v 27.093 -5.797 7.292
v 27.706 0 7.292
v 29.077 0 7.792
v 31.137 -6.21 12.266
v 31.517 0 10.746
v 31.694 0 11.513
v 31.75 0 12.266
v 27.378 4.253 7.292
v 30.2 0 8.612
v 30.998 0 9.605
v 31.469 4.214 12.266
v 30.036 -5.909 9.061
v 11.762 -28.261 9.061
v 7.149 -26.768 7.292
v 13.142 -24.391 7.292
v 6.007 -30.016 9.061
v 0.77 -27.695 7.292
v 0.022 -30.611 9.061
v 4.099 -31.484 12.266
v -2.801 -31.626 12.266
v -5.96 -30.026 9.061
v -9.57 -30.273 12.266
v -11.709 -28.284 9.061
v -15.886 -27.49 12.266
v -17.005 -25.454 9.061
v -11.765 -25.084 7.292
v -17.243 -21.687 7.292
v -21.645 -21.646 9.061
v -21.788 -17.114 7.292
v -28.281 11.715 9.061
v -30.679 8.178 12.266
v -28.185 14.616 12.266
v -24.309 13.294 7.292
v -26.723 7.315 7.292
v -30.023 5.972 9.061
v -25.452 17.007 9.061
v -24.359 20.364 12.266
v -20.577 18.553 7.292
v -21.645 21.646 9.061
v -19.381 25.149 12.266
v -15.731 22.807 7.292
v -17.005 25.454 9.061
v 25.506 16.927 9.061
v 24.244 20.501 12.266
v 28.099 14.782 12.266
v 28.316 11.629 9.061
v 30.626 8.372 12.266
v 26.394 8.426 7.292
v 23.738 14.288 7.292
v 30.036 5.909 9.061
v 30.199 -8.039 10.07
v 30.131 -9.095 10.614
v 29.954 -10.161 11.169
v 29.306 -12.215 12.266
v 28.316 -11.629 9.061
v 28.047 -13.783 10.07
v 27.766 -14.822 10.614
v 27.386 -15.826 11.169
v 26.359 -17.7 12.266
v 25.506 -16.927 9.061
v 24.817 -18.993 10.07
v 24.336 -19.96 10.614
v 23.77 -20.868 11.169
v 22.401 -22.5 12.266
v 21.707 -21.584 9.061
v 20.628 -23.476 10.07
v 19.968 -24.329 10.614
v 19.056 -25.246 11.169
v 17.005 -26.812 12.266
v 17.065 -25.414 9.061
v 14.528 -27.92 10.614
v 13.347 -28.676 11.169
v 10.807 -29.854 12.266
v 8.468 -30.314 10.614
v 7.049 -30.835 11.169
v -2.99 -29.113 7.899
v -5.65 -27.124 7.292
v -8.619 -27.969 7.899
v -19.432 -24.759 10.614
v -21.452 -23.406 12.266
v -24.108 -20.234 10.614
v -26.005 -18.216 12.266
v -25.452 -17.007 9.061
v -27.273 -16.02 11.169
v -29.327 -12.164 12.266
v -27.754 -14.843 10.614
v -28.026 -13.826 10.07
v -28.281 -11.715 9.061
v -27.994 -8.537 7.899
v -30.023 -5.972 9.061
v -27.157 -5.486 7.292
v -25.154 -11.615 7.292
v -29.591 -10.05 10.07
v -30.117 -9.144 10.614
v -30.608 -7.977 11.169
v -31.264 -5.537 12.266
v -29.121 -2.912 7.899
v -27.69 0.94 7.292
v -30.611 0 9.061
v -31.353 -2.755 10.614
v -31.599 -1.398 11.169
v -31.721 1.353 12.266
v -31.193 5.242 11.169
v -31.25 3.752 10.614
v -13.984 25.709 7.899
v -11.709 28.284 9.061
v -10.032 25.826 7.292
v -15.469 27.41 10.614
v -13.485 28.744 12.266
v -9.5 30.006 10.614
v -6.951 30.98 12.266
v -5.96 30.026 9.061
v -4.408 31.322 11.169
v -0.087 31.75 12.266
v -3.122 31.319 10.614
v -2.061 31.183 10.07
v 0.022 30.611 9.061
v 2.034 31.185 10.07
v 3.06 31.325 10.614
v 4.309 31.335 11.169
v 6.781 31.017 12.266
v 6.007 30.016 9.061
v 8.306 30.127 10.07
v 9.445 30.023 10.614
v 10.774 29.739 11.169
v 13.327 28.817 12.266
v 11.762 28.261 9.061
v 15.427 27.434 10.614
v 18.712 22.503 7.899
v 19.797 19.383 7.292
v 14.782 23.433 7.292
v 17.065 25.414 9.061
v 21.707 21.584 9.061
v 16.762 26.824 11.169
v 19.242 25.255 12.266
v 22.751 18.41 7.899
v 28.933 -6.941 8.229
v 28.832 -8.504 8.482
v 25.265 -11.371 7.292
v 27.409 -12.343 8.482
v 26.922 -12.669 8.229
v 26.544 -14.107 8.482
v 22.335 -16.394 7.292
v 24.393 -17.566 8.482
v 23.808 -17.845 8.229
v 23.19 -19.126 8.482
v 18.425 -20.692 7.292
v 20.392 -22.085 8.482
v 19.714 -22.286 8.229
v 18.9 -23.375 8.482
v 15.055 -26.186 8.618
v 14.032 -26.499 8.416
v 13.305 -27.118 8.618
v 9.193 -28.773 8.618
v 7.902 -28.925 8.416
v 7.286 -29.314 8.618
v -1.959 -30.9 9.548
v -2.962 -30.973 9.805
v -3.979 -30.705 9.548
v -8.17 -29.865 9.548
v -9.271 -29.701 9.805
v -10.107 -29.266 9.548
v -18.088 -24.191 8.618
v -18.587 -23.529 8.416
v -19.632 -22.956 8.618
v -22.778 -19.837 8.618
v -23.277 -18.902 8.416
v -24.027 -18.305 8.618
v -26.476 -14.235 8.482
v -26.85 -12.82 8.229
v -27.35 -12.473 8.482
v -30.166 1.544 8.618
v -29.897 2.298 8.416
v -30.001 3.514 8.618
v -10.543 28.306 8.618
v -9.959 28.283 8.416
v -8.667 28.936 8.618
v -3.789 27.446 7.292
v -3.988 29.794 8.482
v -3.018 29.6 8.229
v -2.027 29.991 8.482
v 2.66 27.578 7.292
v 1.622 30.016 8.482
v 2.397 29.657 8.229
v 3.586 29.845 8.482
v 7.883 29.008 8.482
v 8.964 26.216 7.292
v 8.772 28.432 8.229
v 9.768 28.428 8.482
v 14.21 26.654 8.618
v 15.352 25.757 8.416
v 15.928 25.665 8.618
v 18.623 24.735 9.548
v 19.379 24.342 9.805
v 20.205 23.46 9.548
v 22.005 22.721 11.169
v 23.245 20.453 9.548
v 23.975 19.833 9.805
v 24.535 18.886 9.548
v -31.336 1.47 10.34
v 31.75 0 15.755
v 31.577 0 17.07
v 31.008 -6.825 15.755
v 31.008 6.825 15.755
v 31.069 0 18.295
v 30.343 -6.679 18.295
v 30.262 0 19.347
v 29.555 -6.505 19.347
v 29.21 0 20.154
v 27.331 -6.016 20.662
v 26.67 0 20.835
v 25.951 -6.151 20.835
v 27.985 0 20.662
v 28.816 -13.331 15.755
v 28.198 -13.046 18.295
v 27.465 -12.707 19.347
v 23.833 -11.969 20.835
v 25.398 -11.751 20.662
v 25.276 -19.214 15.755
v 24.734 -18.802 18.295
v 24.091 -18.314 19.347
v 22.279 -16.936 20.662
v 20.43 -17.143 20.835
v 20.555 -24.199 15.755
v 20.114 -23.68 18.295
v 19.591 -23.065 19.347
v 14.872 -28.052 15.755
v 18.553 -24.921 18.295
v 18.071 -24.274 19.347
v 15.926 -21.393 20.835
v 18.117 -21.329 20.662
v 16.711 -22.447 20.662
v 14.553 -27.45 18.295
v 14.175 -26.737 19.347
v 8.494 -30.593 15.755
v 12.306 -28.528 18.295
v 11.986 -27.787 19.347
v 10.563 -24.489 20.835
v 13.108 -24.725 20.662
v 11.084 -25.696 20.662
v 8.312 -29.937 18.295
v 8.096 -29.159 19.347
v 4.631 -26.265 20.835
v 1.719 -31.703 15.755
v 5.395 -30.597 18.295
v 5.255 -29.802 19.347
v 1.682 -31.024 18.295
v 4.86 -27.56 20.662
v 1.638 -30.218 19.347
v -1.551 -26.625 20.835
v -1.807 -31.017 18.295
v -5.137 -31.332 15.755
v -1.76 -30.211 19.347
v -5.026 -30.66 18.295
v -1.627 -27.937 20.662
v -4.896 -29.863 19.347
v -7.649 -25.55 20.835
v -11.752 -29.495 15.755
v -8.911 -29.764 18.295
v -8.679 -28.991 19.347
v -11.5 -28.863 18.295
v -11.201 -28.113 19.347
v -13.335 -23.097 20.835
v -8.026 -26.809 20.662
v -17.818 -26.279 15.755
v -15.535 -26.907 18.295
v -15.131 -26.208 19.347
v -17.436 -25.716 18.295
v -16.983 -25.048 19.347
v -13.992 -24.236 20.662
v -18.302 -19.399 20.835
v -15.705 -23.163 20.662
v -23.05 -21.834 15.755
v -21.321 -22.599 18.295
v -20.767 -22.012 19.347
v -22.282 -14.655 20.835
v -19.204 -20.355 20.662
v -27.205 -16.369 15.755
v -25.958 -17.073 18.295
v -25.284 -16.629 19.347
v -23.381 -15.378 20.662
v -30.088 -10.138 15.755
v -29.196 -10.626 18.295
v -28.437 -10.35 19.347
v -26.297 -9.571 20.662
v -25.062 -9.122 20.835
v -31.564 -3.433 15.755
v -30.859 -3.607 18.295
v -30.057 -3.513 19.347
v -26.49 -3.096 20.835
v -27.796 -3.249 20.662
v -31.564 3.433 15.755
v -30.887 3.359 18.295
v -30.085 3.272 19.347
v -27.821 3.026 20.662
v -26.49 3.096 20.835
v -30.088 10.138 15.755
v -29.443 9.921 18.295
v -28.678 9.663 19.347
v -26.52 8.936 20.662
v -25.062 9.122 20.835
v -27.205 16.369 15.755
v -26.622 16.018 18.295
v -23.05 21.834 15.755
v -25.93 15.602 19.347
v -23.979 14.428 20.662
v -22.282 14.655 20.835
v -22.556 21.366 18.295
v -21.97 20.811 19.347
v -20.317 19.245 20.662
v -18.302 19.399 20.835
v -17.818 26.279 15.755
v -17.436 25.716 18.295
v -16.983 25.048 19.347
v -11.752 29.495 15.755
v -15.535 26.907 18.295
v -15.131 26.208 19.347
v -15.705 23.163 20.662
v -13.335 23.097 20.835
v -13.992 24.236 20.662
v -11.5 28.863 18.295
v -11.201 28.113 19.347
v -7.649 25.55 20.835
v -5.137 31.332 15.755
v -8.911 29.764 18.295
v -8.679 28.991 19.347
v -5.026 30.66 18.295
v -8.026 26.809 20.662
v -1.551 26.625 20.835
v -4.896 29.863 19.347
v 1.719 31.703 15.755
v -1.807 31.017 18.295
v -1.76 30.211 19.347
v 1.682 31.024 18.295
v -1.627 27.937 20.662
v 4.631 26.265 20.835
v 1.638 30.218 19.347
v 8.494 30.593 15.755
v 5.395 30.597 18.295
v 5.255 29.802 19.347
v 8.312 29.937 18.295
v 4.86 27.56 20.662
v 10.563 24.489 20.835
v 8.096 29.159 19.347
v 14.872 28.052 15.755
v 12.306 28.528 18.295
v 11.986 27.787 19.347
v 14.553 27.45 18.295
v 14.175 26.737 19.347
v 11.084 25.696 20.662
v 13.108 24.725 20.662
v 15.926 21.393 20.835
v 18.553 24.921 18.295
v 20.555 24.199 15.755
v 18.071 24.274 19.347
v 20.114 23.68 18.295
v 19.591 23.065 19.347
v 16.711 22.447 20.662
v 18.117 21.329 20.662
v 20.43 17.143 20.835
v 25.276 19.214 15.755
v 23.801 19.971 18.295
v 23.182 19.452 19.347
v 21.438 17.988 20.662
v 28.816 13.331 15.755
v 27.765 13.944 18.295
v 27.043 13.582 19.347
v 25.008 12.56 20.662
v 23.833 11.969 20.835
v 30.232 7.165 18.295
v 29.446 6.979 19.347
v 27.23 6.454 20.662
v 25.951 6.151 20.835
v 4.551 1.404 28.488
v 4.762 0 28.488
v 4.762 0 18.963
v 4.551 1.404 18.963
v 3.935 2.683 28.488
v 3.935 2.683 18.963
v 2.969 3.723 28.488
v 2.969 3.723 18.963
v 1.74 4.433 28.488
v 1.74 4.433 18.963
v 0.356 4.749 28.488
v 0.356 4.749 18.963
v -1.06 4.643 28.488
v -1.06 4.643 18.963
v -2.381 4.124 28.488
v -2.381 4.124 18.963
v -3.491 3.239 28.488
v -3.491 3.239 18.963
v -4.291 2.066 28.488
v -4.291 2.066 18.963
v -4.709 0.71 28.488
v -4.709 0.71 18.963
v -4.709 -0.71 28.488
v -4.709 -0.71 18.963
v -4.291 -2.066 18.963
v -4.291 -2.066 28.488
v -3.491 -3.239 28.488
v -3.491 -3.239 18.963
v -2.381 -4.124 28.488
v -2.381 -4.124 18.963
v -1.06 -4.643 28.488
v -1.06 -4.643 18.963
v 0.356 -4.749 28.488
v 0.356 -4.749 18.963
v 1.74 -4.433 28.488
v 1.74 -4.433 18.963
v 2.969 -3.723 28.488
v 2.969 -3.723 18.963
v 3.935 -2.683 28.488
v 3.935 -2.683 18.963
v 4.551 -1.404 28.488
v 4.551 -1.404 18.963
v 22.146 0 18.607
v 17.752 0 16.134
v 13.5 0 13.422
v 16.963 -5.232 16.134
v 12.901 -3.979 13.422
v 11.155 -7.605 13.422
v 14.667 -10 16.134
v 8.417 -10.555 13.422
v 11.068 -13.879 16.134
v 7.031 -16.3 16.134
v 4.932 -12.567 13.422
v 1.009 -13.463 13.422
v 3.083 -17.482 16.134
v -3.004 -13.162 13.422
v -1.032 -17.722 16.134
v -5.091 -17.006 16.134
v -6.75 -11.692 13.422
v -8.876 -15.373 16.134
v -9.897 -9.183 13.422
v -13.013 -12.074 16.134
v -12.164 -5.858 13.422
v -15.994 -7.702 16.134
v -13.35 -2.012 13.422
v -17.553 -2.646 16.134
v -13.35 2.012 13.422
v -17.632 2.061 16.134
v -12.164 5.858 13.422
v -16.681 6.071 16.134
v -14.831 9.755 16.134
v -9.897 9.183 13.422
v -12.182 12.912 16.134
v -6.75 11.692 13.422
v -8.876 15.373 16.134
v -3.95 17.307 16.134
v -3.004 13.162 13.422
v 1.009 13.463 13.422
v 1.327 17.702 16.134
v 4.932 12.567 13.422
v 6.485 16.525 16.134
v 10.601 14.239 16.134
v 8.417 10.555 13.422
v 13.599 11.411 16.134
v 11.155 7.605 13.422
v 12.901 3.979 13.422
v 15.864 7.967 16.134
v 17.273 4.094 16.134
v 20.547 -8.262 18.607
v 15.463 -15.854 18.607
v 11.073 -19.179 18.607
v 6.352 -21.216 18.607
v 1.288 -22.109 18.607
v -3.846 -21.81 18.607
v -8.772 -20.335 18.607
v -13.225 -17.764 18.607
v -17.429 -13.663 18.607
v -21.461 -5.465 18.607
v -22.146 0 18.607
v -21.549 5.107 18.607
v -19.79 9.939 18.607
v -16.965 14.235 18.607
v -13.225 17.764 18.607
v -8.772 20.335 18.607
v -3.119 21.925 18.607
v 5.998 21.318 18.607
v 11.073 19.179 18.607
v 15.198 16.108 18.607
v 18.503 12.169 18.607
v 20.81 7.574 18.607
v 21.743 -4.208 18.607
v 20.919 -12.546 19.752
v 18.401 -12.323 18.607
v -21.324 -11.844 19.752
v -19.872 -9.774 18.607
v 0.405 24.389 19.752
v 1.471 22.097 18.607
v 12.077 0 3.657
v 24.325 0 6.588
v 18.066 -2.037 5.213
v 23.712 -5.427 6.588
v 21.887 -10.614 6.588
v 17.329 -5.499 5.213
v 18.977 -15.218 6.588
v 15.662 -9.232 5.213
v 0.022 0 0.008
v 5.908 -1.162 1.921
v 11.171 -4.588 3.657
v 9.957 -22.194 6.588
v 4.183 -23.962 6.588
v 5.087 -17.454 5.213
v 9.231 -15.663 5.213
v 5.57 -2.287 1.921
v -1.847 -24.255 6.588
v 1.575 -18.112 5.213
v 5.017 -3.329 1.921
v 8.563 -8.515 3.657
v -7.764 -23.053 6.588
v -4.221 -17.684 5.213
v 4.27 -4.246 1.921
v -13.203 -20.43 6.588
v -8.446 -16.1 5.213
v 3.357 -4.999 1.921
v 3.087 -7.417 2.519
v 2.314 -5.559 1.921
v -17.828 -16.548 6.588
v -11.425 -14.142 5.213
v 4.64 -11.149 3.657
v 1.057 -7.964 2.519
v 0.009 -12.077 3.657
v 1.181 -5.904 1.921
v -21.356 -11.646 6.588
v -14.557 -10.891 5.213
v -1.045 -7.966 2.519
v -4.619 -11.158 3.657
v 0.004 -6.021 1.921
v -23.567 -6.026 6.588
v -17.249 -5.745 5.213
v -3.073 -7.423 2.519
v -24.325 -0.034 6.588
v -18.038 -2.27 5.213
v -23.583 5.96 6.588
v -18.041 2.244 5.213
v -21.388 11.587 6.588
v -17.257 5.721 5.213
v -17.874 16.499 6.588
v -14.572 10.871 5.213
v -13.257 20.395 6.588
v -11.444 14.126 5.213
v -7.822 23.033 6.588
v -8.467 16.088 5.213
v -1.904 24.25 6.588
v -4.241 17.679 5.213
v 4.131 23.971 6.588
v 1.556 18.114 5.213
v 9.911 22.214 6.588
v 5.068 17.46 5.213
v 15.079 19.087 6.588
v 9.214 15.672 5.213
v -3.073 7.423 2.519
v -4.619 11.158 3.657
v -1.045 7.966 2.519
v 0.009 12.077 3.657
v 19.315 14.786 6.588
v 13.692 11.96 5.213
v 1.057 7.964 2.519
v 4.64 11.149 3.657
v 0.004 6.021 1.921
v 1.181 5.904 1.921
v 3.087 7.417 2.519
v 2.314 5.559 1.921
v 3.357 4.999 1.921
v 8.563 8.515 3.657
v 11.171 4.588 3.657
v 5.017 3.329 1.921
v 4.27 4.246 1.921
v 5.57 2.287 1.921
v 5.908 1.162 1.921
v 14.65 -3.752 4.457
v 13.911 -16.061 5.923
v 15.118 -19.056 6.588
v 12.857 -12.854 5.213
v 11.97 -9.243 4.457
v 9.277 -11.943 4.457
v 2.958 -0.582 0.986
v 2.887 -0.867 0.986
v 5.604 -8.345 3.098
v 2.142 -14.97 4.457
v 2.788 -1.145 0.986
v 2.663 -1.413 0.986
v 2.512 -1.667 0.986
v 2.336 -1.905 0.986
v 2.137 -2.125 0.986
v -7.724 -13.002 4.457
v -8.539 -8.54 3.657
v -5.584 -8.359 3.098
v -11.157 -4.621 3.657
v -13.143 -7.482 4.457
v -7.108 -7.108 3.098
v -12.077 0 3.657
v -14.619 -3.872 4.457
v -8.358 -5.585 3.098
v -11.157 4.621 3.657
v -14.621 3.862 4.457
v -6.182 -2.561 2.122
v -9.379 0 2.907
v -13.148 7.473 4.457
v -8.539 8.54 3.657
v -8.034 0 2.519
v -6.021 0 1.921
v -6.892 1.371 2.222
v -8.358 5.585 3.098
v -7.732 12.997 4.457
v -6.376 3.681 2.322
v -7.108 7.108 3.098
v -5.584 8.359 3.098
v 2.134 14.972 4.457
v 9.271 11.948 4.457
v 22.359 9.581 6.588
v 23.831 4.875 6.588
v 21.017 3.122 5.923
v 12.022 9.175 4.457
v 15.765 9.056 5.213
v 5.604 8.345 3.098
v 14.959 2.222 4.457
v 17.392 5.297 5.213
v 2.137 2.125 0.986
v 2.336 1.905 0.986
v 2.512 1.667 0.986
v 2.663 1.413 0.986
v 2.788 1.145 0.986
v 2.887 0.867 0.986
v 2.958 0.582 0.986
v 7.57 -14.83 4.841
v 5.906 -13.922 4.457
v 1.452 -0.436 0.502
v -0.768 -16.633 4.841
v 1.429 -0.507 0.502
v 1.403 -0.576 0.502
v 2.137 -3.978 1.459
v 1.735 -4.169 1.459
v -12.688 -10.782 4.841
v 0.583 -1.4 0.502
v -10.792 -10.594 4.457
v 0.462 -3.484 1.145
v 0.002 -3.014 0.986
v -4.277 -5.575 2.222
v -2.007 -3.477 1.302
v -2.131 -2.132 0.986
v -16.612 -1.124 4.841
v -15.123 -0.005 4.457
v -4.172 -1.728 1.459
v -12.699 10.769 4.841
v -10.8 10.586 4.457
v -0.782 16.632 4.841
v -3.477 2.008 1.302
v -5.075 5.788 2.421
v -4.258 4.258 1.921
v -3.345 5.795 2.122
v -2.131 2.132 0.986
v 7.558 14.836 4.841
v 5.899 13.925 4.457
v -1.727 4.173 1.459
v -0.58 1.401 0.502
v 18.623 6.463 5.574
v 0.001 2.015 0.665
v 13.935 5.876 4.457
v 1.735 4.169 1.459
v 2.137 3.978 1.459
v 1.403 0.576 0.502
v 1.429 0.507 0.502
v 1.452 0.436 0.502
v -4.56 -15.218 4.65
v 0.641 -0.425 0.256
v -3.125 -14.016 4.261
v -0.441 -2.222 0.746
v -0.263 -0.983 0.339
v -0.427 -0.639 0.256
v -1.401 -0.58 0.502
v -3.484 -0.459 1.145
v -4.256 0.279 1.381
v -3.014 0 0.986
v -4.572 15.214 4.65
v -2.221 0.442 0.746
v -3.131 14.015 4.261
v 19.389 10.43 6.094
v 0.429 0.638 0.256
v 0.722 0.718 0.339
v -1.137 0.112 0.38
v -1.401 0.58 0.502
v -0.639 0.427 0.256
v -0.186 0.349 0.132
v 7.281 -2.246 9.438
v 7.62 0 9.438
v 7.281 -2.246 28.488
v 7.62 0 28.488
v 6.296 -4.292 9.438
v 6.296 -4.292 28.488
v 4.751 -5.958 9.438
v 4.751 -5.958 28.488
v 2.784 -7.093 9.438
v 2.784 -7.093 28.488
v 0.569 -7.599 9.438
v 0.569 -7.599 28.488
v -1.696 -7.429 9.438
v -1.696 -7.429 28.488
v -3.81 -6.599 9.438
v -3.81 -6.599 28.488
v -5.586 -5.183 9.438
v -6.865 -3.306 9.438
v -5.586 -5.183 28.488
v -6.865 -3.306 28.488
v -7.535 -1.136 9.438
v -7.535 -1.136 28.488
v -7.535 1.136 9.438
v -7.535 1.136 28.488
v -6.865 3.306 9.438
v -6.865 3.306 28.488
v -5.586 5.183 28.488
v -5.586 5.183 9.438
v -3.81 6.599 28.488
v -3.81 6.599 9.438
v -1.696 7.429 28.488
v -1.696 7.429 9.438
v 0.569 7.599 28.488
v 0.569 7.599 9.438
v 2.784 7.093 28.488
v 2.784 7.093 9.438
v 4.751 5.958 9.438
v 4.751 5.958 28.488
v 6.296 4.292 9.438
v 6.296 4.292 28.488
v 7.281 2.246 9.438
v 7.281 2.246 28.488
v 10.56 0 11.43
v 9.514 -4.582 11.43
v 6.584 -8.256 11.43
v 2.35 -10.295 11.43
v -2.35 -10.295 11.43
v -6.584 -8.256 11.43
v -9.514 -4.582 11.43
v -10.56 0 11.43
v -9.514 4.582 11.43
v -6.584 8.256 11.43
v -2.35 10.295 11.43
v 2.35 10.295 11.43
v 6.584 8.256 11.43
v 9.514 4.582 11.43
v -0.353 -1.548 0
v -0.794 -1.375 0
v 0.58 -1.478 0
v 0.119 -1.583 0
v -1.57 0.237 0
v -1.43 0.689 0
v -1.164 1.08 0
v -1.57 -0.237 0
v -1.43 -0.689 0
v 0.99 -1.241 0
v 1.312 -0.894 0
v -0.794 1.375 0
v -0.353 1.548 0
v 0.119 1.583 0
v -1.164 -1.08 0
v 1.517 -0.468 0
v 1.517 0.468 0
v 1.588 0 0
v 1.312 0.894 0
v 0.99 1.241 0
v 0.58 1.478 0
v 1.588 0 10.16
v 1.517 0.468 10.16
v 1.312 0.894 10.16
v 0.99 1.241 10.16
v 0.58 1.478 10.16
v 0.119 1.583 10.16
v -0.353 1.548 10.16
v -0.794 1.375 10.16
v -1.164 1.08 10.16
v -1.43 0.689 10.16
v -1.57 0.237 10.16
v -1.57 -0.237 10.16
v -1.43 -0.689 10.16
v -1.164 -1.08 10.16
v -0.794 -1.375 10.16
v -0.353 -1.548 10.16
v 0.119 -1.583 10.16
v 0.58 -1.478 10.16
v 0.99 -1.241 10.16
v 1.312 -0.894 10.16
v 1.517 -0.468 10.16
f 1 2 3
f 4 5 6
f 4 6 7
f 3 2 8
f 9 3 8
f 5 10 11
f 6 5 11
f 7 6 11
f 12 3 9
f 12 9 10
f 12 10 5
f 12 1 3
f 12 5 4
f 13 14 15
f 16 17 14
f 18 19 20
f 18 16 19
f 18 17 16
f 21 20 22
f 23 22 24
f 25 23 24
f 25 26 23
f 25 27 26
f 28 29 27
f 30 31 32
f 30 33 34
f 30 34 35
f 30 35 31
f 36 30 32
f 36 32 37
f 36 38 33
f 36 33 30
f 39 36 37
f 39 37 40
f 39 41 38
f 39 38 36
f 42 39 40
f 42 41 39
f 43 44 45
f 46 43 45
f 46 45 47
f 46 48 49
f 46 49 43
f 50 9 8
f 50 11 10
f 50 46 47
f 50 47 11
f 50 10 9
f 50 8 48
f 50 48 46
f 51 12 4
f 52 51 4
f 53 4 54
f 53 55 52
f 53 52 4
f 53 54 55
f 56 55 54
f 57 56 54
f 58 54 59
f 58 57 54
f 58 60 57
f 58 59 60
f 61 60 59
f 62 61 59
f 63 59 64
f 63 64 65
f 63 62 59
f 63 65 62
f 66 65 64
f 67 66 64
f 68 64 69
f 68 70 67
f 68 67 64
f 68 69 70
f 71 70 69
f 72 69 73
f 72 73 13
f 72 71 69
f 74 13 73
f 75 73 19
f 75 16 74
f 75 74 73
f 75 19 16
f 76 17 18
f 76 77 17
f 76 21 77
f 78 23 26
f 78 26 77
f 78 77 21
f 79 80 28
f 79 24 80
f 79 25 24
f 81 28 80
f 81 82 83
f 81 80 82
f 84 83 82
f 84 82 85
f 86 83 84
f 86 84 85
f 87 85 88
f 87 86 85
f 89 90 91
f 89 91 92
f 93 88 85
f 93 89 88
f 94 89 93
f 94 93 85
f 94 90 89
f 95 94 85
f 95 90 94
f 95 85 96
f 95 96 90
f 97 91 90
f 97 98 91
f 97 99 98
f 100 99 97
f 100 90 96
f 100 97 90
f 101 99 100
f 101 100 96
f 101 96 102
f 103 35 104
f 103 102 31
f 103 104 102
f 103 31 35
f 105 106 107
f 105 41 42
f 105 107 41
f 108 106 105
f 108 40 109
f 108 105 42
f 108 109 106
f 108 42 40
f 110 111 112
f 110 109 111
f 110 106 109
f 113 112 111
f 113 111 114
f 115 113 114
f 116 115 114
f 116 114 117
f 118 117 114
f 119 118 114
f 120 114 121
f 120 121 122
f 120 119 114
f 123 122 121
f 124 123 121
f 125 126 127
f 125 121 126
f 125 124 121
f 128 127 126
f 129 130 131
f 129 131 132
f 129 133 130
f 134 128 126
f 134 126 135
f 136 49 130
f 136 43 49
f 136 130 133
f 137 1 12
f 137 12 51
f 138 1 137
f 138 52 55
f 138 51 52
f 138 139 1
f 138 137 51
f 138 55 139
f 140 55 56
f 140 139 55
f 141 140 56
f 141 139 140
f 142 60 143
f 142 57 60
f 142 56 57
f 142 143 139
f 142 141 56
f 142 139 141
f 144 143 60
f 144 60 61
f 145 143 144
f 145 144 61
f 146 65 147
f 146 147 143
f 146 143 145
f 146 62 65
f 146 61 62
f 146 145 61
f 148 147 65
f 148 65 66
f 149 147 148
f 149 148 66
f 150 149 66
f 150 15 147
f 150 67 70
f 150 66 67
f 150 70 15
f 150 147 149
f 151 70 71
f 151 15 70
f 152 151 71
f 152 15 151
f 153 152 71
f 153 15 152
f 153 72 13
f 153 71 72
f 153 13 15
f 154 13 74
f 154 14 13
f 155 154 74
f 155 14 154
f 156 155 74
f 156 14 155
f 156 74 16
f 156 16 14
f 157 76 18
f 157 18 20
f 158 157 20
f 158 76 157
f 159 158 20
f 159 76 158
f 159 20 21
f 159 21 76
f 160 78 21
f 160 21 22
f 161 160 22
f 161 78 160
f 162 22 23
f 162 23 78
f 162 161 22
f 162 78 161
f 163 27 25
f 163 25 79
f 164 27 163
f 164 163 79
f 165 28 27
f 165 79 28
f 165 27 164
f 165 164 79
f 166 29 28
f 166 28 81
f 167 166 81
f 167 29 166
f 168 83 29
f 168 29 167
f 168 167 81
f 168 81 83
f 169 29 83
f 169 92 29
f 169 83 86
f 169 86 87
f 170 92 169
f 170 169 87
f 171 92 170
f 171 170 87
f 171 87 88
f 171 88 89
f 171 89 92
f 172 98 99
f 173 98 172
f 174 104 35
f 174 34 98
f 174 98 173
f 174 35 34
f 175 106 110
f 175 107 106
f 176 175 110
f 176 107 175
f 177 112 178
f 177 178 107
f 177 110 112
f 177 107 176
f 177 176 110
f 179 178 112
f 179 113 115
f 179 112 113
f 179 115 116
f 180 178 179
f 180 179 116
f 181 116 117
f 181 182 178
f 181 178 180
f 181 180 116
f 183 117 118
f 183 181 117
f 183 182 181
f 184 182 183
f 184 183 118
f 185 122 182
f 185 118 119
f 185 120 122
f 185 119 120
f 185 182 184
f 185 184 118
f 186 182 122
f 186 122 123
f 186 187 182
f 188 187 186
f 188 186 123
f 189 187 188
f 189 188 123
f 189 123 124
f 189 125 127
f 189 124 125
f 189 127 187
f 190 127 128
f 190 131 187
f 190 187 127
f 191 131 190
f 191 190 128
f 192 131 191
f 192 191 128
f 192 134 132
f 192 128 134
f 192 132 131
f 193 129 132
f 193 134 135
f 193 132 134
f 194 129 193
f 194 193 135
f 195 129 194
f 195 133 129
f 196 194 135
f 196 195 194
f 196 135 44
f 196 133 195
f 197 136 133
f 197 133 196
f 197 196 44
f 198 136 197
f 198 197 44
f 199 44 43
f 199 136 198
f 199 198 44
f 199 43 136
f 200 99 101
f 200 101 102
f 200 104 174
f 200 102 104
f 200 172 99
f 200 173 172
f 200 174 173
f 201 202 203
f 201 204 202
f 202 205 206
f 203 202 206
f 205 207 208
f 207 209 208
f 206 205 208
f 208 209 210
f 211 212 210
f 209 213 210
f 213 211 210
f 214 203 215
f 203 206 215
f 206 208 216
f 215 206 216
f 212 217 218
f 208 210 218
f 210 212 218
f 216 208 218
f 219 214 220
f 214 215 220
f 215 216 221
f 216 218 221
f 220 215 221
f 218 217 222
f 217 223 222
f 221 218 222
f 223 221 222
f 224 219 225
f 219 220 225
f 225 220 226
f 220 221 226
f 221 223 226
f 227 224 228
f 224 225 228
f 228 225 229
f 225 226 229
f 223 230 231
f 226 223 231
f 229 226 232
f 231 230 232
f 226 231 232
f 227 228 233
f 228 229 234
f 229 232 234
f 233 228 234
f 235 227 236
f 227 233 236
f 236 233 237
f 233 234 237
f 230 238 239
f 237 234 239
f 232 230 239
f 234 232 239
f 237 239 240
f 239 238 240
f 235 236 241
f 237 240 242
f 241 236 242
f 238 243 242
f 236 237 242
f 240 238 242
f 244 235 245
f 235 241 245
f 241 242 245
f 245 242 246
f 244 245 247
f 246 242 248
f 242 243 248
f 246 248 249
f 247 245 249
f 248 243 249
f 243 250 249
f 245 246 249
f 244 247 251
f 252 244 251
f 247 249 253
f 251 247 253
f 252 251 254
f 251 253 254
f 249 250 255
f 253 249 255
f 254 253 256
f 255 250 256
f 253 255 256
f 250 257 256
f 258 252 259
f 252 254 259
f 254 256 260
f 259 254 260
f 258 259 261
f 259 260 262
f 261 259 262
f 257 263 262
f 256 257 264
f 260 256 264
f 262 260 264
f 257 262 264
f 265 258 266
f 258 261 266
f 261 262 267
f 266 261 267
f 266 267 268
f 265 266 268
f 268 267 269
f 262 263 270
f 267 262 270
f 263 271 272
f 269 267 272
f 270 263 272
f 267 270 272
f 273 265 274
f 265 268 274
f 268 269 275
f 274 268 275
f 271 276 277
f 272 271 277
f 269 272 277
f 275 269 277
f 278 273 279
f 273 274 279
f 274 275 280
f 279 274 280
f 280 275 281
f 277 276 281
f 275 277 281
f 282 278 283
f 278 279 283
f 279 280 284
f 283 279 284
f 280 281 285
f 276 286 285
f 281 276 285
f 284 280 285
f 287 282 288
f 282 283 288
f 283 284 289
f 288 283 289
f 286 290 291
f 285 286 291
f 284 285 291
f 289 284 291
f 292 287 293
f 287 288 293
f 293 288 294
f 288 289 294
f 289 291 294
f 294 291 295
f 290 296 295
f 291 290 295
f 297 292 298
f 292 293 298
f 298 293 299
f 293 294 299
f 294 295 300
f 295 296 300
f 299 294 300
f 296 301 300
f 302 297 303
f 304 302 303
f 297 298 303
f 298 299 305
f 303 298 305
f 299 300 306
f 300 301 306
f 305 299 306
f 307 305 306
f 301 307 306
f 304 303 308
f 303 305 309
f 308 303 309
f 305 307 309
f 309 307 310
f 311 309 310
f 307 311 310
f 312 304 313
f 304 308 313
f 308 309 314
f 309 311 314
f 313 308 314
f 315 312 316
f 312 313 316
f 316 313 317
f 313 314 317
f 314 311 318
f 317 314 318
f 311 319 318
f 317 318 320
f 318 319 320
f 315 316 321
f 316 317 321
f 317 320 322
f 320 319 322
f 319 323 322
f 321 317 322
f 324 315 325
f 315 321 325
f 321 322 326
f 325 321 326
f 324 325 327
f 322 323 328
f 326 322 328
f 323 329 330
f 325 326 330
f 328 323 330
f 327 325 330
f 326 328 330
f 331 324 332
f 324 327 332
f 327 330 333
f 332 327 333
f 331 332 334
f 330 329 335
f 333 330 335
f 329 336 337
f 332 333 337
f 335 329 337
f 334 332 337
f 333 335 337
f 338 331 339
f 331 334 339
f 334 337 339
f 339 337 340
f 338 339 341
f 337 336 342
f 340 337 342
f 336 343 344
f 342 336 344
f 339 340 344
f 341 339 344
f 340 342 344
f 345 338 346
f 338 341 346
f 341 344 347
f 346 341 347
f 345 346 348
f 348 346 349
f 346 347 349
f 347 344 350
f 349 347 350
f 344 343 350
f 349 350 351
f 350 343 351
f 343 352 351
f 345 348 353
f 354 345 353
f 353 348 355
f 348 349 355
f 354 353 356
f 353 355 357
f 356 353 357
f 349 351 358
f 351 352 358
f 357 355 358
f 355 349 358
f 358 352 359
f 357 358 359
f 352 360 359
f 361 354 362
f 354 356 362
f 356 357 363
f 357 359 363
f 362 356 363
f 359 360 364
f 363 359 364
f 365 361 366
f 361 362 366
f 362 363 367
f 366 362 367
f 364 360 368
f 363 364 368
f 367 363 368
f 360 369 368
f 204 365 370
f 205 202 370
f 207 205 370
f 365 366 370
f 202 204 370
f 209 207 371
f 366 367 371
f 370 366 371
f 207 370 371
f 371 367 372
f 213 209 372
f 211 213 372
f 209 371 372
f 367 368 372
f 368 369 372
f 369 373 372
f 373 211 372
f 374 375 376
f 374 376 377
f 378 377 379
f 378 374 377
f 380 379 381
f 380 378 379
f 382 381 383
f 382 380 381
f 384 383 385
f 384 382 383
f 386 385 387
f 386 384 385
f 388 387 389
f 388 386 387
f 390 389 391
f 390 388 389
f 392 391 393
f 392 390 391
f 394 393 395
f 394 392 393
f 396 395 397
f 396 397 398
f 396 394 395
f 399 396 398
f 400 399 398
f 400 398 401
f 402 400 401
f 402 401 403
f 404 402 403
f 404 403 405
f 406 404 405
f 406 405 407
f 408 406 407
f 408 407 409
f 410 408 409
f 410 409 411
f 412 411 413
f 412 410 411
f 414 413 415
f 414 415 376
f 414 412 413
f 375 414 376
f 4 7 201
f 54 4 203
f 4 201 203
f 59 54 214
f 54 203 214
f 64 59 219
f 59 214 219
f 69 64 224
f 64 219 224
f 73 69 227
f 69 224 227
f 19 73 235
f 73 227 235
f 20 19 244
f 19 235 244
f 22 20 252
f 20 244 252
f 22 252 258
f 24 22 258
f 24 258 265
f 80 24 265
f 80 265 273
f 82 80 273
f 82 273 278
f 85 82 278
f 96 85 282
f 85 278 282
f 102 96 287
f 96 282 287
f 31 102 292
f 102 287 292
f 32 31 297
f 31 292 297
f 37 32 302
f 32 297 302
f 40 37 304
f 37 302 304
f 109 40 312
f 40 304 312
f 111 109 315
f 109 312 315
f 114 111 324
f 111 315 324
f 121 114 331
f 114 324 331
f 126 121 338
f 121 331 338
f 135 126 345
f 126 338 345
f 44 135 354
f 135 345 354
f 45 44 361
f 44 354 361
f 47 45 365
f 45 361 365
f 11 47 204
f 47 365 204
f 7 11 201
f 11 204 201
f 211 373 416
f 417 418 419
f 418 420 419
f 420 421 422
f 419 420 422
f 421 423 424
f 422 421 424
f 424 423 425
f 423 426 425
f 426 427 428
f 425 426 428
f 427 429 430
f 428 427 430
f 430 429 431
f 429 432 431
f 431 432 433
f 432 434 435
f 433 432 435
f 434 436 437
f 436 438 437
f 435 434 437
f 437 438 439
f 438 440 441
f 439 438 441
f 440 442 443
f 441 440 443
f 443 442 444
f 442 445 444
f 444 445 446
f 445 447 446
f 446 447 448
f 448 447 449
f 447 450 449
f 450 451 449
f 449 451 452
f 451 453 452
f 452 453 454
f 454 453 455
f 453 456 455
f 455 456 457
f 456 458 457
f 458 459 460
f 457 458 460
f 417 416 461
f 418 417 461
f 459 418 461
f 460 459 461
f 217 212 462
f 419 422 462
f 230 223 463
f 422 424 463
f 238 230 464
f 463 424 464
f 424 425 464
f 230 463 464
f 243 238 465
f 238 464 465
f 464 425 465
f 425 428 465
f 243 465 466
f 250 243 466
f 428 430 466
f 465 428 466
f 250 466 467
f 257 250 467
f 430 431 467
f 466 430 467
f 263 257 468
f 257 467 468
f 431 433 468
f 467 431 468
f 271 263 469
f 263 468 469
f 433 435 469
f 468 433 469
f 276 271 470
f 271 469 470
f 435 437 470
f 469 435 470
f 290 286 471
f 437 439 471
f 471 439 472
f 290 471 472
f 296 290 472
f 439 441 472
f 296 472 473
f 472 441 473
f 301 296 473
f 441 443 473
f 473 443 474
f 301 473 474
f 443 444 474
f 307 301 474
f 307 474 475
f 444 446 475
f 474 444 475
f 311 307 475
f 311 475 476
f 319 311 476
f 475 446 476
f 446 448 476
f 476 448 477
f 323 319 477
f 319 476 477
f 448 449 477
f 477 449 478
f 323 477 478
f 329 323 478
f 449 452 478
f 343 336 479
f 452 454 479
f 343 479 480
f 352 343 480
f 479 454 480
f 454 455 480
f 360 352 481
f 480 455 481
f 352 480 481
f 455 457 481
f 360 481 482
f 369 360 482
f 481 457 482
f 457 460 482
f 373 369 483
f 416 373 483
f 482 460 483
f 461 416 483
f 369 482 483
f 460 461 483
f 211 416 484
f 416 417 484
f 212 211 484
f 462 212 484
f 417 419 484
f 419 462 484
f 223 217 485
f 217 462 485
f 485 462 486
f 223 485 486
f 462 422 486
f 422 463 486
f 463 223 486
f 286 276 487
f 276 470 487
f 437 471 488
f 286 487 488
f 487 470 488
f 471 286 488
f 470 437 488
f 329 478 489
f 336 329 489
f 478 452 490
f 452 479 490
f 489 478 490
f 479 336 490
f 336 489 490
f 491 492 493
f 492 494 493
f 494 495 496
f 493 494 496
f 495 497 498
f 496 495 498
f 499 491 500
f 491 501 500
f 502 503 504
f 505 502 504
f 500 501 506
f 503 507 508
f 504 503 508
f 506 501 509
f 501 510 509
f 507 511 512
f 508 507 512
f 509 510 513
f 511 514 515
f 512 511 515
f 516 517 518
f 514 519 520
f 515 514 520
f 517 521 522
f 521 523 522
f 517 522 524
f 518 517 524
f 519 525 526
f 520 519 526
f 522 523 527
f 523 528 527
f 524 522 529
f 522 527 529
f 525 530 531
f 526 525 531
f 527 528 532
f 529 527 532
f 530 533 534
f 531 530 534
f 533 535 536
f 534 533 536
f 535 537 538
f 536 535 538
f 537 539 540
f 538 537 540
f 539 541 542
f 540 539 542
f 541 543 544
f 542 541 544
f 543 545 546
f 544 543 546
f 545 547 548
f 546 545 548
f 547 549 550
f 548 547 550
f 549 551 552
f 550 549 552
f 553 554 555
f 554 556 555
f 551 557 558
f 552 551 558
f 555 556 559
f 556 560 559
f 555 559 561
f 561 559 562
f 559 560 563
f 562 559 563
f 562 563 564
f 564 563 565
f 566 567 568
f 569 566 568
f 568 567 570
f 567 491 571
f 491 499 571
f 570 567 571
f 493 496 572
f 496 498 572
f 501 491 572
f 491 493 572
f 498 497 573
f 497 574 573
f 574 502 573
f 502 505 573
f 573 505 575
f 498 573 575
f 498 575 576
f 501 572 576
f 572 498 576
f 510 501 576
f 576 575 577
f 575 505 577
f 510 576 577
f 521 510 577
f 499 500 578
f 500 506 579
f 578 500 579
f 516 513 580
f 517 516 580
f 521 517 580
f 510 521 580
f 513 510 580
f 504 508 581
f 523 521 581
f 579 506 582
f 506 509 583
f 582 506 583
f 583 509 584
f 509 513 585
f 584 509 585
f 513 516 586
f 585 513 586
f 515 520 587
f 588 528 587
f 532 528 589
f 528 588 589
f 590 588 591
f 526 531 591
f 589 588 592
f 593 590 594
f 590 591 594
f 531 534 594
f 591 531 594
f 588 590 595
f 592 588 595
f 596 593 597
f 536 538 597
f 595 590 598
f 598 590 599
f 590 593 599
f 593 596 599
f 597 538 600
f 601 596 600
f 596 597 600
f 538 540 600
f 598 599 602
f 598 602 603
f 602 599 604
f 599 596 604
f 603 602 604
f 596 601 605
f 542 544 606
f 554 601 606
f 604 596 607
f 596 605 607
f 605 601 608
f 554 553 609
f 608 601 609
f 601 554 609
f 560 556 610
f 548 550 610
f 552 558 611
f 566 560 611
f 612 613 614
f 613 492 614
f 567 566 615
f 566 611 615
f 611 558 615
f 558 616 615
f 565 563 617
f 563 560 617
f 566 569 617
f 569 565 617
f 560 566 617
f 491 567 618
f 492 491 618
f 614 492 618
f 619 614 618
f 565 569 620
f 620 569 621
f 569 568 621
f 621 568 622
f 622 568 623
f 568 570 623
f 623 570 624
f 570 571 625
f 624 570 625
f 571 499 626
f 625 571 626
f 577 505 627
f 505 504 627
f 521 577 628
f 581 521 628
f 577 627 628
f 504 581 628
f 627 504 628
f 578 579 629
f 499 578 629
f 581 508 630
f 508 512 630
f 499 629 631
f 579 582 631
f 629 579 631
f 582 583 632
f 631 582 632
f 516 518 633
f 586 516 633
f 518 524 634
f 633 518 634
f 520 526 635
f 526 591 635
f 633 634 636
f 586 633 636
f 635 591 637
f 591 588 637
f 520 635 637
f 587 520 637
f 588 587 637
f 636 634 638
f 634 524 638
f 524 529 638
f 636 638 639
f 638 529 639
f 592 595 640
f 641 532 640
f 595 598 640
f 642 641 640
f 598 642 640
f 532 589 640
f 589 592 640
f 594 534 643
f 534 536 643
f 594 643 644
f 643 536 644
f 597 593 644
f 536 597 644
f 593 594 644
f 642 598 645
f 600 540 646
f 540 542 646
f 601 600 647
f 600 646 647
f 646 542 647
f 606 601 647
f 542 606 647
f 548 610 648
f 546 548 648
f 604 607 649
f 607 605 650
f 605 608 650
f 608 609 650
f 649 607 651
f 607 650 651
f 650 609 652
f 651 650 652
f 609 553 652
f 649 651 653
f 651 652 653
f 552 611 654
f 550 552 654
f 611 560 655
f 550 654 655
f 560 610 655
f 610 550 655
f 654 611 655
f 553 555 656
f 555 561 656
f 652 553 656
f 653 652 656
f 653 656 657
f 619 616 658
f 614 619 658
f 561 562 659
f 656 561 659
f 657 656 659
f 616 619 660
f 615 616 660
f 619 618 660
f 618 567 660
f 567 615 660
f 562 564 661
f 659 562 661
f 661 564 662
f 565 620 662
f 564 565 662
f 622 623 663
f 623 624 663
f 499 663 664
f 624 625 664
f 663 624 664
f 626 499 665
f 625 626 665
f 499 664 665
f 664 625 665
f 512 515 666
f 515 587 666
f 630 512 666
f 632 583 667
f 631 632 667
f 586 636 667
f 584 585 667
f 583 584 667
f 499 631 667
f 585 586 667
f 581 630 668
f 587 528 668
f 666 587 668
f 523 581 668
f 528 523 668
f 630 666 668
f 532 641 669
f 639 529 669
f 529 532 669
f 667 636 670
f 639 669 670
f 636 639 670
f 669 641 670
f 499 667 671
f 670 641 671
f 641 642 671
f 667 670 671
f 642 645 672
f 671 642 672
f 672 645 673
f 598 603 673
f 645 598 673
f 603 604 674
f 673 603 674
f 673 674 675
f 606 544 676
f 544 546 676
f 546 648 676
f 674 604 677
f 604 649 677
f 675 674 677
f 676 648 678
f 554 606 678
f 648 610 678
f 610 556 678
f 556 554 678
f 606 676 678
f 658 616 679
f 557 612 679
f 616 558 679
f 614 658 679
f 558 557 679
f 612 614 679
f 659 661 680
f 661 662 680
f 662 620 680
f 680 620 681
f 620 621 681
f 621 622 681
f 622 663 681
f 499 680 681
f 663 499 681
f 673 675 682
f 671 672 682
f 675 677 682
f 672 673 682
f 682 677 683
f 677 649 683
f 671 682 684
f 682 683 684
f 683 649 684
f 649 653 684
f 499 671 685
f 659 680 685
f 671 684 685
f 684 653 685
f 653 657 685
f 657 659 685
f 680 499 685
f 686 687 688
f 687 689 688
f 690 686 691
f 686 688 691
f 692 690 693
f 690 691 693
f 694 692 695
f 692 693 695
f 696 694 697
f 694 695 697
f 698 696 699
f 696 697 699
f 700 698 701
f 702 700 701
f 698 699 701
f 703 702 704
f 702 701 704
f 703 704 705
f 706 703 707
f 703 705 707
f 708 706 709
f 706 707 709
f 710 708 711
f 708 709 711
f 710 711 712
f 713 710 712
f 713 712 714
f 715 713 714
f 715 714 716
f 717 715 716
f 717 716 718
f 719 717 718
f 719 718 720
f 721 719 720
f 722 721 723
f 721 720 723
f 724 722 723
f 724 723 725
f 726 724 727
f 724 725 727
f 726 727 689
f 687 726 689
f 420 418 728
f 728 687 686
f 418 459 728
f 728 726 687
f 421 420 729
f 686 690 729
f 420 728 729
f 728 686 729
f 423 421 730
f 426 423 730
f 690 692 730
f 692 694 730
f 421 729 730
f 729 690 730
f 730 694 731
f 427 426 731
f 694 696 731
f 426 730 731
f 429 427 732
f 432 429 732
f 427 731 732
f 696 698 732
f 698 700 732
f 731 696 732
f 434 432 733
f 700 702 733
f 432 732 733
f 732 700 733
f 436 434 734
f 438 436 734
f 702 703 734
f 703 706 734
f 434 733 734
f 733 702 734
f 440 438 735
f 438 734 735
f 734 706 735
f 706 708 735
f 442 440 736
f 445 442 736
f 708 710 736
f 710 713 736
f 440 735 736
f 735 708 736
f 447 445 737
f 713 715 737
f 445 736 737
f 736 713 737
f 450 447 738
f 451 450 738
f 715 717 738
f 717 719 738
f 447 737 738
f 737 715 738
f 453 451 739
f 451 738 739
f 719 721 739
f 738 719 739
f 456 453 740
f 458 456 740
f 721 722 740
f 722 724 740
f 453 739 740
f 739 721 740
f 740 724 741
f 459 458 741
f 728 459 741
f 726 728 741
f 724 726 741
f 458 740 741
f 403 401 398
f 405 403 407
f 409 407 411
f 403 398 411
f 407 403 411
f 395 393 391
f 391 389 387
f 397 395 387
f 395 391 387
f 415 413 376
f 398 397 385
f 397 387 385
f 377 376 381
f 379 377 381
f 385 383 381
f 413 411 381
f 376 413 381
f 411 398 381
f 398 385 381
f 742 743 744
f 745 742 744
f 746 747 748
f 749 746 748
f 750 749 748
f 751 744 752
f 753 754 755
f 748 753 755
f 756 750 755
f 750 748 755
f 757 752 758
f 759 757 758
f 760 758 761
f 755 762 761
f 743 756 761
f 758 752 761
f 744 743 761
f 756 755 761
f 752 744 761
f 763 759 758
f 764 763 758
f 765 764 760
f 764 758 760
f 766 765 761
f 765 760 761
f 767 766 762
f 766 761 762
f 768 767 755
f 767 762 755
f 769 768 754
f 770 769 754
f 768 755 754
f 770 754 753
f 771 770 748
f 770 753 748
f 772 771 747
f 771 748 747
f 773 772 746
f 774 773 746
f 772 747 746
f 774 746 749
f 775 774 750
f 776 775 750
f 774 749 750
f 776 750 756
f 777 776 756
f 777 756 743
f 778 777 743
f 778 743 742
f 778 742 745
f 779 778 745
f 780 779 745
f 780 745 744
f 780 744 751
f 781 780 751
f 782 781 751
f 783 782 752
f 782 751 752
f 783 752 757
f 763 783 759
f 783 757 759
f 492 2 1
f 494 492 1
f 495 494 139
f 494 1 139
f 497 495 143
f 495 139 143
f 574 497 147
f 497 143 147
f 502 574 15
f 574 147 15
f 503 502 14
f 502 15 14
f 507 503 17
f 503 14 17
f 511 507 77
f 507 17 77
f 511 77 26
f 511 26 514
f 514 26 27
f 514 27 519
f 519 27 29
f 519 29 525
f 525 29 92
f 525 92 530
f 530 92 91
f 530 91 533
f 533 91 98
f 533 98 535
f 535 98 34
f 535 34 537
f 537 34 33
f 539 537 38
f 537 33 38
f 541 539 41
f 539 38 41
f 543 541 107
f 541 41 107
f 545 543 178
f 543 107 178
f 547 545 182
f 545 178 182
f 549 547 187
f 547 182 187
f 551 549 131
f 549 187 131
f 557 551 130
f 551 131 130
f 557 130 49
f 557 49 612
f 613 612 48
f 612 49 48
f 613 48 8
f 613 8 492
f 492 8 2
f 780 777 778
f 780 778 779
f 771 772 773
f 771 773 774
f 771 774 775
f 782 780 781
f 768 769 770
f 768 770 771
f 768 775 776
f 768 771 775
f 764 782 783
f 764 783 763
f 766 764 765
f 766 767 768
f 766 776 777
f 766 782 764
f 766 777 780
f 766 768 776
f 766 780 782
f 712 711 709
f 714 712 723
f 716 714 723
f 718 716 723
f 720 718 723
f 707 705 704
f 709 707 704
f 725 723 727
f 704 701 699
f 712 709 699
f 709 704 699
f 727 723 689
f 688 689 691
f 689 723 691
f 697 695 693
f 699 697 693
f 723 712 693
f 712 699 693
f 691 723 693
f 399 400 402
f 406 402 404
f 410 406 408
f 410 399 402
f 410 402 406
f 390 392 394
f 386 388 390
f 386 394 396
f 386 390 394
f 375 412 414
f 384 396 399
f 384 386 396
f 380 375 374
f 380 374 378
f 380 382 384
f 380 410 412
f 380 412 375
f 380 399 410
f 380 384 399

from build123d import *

# Parameters (mm, degrees)
F2_R     = 5.08
F4_R     = 213.36
F5_R     = 4.7625
F6_DEPTH = 9.525
F7_R     = 1.5875
F8_DEPTH = 10.16


# Not quite as in the source:
# - a fillet or chamfer that OpenCascade refuses, or shapes differently, is made with other operations: its cross-section is extruded or revolved along the edge and cut away or added


with BuildPart() as f1:
    # F0 (on Front) → F1 (revolve)
    with BuildSketch(Plane.XZ):
        Polygon((11.9791877568, 4.0159458295), (31.75, 8.134865202), (31.75, 20.834865202), (24.4433090497, 20.834865202), (7.62, 9.4384327507), (7.62, 28.4884327507), (0, 28.4884327507), (0, 0), align=None)
    revolve(axis=Axis((0, 0, 14.2442163754), (0, 0, -1)))

    # F2
    f2_edges = [f1.edges().sort_by_distance(p)[0] for p in [
        (-31.75, 0, 8.134865),
        (-31.75, 0, 20.834865),
        (31.75, 0, 14.484865),
    ]]
    fillet(f2_edges, radius=F2_R)

    # F3: fillet of radius 91.44 on 2 edges, made by hand

    # F3_s1 → F3_t2 (revolve, cut)
    with BuildSketch(Plane.XZ):
        with BuildLine():
            ThreePointArc((26.67, 20.834865202), (19.9318360713, 17.4009600318), (13.5004823618, 13.4219843706))
            Line((13.5004823618, 13.4219843706), (24.4433090497, 20.834865202))
            Line((24.4433090497, 20.834865202), (26.67, 20.834865202))
        make_face()
    revolve(axis=Axis((0, 0, 20.834865202), (0, 0, -1)), mode=Mode.SUBTRACT)

    # F4
    f4_edges = [f1.edges().sort_by_distance(p)[0] for p in [
        (-11.979188, 0, 4.015946),
        (-27.706088, 0, 7.292383),
    ]]
    fillet(f4_edges, radius=F4_R)


with BuildPart() as f6:
    # F5 (on face) → F6 (new body)
    with BuildSketch(Plane.XY.offset(28.4884327507)):
        Circle(F5_R)
    extrude(amount=-F6_DEPTH)


with BuildPart() as f8:
    # F7 (on Top) → F8 (new body)
    with BuildSketch(Plane.XY):
        Circle(F7_R)
    extrude(amount=F8_DEPTH)


solid = Compound([f1.part, f6.part, f8.part])
